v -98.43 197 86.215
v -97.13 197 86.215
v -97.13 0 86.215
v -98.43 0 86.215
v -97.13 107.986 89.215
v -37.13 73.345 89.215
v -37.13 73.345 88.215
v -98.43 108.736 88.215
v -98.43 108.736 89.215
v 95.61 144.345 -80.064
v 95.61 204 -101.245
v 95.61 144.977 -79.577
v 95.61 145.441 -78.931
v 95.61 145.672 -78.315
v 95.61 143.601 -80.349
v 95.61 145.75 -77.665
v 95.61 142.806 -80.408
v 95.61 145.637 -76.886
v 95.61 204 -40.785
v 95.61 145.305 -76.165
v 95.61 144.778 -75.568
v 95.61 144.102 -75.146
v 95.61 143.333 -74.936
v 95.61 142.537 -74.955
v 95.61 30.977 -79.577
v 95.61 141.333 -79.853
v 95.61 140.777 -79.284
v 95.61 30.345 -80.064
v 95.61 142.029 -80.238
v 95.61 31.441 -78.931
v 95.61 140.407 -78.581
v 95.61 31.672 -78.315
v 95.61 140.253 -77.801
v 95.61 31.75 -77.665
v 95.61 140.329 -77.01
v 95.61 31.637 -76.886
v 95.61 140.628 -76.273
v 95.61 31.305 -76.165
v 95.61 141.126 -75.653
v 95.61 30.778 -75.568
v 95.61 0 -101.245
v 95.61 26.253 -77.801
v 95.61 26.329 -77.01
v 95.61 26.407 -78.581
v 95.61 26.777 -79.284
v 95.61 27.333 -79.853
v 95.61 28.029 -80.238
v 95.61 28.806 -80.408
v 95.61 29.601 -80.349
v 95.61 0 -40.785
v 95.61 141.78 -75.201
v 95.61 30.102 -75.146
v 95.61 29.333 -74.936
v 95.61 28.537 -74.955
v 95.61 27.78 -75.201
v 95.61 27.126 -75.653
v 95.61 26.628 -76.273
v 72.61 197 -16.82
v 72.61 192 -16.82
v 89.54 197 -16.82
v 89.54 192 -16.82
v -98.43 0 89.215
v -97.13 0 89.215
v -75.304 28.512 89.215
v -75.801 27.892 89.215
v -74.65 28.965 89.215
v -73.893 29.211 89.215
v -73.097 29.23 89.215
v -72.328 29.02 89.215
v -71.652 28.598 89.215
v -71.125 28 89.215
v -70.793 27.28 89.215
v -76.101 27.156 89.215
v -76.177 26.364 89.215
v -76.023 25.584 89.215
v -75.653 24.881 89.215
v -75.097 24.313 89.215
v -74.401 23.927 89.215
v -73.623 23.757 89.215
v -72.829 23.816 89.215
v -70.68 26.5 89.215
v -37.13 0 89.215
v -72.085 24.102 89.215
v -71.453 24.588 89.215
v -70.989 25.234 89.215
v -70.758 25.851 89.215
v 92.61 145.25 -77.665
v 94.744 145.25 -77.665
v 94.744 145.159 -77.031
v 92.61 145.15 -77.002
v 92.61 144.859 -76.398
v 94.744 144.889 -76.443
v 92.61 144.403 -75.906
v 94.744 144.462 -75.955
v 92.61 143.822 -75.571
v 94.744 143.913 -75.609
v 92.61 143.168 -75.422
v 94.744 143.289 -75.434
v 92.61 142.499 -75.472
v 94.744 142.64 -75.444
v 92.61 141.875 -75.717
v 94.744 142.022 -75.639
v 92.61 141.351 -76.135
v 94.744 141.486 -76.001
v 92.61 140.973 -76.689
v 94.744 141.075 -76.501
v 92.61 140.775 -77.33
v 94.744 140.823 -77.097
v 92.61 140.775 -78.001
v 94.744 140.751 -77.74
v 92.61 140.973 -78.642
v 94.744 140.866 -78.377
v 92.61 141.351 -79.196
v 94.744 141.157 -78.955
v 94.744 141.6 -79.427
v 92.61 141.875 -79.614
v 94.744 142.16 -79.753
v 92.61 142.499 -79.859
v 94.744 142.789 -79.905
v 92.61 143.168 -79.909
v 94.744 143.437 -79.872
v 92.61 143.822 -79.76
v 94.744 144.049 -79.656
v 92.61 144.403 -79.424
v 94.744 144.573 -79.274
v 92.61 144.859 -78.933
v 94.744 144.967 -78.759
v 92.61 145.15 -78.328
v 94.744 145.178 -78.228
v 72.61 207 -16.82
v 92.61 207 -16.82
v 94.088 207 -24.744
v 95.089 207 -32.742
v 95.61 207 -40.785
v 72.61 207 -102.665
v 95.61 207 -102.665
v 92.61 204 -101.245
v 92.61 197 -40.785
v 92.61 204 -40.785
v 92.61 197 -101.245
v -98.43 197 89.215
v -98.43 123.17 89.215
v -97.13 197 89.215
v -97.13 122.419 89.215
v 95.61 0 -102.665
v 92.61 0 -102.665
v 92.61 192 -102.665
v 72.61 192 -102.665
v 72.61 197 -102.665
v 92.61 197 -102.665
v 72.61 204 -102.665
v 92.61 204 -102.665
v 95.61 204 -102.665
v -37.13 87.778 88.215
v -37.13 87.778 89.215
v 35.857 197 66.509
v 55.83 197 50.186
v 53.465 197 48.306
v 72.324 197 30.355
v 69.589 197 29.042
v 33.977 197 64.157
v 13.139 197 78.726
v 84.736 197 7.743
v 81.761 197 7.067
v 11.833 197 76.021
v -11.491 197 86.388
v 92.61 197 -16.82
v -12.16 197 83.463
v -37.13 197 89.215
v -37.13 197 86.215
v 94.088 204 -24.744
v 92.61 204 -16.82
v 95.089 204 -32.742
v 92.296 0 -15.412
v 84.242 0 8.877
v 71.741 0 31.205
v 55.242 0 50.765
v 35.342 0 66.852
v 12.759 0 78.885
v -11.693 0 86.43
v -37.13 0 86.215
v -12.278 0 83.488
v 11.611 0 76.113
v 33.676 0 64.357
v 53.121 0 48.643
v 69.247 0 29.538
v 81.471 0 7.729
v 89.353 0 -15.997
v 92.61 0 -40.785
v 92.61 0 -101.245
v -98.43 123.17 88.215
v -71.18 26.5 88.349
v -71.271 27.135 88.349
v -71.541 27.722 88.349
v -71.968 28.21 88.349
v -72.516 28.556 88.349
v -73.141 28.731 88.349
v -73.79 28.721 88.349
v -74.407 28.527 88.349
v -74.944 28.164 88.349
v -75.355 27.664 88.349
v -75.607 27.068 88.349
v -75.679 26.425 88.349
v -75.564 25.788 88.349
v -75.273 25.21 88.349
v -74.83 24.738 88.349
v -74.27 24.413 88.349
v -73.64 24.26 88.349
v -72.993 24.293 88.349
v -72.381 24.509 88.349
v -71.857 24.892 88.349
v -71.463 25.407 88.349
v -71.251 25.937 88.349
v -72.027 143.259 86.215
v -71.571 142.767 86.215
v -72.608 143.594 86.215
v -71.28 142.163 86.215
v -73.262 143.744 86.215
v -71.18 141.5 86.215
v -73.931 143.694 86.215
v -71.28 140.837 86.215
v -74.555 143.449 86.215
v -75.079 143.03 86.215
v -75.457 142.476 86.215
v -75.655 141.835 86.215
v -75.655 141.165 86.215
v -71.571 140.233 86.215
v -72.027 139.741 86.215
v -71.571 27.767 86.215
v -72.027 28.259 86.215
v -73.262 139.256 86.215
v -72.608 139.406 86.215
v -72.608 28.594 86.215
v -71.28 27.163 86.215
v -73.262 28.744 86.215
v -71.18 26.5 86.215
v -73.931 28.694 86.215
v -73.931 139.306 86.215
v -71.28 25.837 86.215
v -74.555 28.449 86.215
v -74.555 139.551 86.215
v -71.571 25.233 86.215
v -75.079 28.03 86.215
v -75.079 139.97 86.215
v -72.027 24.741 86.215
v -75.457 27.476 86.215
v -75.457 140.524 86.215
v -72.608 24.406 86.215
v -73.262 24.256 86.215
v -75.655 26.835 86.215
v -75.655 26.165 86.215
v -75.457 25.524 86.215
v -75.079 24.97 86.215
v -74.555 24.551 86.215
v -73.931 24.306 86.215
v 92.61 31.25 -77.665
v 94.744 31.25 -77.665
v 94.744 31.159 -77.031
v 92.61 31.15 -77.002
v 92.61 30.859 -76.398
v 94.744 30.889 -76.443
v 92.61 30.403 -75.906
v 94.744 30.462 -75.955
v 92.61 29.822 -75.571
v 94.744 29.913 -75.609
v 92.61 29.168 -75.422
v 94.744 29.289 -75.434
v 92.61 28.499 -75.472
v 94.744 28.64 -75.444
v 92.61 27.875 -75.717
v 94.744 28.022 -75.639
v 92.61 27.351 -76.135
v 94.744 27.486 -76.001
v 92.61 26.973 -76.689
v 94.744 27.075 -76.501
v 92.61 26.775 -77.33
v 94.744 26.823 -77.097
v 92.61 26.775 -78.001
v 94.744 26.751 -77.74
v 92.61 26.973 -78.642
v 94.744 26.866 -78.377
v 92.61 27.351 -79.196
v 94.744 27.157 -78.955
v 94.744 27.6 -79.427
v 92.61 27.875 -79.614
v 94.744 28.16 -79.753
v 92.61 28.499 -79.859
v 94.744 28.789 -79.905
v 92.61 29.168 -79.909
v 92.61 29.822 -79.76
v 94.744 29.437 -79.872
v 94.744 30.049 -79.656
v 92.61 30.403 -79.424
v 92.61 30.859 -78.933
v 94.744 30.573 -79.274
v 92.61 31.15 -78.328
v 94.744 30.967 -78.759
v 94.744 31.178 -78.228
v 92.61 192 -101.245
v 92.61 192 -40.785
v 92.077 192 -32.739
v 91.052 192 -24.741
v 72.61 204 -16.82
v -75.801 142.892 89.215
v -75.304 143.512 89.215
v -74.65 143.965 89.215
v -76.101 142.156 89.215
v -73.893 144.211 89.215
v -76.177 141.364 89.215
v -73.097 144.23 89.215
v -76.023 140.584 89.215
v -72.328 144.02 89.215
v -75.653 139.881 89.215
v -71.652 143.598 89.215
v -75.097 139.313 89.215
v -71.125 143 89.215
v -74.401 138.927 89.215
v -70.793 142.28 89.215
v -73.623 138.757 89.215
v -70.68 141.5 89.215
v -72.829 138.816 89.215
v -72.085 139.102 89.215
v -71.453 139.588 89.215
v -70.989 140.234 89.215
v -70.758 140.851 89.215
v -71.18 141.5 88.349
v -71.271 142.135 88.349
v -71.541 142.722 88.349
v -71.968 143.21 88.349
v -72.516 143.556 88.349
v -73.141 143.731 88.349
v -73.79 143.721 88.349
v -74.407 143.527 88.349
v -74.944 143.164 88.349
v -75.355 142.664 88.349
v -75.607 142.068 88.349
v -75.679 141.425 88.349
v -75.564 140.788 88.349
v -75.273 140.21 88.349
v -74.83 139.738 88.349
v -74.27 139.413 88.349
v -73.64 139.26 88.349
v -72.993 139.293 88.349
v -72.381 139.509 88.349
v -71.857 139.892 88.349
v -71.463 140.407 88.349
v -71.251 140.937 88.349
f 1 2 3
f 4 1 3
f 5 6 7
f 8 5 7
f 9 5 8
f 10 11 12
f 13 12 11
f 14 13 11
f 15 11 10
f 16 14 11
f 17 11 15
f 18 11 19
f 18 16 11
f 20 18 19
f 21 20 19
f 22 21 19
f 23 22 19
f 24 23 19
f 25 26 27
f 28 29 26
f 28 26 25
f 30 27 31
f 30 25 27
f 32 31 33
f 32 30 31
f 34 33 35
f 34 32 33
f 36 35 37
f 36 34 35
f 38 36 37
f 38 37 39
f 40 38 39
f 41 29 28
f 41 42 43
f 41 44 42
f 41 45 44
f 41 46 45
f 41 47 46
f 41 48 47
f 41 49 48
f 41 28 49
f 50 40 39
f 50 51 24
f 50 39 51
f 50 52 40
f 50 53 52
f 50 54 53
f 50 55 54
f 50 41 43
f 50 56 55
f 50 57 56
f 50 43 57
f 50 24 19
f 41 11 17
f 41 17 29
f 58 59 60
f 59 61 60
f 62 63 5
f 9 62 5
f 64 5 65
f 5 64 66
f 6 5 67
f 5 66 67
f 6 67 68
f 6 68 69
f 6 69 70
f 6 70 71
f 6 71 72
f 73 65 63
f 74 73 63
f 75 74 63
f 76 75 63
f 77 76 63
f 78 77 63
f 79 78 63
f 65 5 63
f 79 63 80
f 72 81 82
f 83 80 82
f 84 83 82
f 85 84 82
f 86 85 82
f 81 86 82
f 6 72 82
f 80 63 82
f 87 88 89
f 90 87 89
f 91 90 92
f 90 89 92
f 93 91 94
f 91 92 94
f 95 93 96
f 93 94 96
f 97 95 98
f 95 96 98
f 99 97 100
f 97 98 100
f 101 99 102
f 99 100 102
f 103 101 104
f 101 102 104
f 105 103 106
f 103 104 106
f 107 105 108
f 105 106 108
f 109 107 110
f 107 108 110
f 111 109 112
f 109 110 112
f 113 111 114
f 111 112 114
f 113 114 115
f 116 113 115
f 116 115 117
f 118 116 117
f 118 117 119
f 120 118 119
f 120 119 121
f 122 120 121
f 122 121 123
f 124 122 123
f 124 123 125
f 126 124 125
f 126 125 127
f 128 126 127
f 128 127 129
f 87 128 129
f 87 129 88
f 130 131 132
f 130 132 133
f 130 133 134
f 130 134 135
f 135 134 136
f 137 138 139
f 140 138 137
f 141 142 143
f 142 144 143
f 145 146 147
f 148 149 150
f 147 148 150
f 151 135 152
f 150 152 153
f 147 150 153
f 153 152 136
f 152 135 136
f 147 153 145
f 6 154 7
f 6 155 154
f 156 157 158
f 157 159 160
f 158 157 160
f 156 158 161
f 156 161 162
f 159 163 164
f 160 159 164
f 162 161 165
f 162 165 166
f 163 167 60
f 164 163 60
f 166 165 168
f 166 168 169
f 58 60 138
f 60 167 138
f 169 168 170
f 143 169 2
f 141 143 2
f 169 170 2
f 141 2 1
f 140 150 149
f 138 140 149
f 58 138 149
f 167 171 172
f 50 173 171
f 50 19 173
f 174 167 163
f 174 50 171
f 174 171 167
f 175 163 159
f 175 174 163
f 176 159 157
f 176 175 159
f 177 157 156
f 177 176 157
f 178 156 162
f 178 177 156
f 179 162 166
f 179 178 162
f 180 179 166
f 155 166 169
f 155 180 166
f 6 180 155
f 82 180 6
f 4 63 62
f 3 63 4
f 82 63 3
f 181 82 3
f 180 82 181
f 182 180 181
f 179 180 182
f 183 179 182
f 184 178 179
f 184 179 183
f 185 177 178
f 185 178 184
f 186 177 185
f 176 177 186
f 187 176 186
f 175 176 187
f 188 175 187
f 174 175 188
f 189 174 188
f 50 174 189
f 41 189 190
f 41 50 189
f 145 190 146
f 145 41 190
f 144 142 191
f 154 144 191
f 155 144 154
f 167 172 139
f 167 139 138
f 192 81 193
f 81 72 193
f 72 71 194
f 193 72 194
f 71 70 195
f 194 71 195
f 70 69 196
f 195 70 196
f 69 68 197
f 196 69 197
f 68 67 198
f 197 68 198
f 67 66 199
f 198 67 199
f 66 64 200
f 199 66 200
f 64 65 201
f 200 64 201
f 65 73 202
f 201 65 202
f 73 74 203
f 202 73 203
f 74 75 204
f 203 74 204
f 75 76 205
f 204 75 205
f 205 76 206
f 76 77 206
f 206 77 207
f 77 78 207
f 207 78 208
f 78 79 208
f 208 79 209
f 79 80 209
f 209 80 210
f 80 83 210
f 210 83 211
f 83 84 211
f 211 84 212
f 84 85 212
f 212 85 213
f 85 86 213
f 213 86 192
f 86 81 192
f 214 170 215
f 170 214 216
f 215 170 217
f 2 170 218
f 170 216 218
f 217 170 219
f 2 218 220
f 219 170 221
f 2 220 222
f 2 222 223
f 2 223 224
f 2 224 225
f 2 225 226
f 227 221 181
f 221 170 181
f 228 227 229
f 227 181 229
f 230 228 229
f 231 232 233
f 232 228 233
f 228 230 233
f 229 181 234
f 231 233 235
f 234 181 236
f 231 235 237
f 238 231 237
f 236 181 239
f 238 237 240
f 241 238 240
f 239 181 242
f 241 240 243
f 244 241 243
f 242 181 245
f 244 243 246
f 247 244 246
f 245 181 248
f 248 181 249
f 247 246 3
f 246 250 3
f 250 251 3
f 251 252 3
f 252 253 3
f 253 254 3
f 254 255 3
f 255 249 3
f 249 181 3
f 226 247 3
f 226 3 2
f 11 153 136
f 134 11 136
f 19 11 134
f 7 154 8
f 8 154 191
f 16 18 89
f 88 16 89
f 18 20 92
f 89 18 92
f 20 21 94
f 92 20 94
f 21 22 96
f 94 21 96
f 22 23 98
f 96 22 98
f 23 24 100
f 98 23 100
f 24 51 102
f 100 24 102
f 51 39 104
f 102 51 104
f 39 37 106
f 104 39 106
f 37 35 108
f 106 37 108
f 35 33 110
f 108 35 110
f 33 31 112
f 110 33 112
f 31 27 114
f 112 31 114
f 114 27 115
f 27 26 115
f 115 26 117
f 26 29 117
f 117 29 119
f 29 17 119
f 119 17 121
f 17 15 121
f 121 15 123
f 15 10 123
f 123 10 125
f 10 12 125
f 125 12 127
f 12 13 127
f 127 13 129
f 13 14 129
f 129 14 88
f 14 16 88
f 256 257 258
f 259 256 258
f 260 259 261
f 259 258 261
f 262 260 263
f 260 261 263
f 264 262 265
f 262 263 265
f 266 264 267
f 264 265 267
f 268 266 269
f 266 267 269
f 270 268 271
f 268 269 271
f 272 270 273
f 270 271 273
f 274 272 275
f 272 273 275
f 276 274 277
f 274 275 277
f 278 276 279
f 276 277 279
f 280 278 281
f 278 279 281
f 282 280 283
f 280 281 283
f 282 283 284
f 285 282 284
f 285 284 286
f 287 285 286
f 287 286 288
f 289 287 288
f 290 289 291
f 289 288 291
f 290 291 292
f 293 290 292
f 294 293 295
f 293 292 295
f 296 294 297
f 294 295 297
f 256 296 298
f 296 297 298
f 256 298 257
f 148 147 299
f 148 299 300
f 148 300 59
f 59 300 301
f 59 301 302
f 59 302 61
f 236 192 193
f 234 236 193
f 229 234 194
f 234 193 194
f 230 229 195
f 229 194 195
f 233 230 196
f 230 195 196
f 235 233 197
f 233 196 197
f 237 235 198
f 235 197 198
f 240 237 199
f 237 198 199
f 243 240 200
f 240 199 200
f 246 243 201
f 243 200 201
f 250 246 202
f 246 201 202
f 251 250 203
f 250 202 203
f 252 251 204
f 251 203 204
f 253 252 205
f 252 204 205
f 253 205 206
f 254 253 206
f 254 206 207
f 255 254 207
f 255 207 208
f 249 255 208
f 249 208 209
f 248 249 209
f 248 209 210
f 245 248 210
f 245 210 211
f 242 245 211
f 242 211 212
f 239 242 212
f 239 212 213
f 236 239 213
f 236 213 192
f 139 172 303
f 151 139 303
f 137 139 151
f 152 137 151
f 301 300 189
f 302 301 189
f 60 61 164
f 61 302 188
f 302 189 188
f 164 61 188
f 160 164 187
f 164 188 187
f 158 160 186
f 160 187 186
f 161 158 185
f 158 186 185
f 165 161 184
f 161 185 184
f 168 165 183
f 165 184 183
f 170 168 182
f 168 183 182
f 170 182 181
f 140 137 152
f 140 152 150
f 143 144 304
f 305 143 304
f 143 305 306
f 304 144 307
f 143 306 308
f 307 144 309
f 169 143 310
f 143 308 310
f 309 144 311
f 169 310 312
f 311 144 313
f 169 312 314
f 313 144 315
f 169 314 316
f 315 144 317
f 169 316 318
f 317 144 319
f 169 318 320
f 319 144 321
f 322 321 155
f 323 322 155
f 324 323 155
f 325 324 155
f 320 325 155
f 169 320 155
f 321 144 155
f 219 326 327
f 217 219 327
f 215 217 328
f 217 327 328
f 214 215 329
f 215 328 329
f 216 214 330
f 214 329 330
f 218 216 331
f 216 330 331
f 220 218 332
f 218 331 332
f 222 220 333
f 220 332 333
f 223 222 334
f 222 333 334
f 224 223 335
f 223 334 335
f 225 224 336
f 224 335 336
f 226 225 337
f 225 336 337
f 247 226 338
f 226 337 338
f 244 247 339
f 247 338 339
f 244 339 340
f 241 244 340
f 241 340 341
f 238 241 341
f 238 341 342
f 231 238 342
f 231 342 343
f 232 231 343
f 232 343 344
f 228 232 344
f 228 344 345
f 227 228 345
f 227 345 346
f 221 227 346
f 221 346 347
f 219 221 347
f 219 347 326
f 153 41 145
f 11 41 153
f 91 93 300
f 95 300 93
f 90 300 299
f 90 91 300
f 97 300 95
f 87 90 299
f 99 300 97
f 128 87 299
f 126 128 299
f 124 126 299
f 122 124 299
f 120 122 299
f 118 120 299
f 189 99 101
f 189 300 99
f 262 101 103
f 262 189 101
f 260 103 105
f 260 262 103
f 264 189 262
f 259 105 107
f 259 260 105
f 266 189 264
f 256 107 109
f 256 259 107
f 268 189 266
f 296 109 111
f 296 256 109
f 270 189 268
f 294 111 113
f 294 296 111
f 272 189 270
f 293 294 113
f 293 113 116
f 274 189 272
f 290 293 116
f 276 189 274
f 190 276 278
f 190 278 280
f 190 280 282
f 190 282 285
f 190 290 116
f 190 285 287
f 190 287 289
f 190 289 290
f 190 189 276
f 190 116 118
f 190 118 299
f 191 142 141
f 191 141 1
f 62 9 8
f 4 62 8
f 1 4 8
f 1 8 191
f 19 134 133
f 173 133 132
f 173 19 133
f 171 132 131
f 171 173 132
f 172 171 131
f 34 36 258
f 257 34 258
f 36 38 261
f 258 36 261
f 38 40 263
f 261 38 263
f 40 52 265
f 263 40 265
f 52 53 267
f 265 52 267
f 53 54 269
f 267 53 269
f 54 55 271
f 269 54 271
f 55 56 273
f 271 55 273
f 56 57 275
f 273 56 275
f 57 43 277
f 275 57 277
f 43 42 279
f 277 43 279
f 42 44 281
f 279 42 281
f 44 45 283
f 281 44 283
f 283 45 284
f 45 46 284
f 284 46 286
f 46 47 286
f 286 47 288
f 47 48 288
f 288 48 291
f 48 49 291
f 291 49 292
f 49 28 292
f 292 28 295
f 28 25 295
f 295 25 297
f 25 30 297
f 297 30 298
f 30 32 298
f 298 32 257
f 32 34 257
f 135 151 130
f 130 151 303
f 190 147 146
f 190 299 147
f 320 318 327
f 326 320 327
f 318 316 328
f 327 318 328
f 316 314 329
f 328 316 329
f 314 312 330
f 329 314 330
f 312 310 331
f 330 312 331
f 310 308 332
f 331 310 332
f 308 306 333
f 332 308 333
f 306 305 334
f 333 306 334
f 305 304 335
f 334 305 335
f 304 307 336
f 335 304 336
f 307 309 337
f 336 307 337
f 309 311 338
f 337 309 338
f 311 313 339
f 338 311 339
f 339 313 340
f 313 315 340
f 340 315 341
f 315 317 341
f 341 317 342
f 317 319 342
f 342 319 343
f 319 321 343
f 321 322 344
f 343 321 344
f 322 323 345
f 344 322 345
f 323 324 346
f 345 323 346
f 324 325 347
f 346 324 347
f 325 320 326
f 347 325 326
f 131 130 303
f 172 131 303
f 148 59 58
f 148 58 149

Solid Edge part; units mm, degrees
sketch "Sketch1" plane through (0, 0, 0) normal (0, -1, 0) x (1, 0, 0)
  arc A0 (-37.1299, 86.2147) -> (92.6101, -40.7853) centre (-39.0034, -45.4688) cw
  line L0 (92.6101, -40.7853) -> (92.6101, -101.2453)
  line L1 (92.6101, -101.2453) -> (95.6101, -101.2453)
  line L2 (95.6101, -101.2453) -> (95.6101, -40.7853)
  arc A1 (-37.1299, 89.2147) -> (95.6101, -40.7853) centre (-39.0019, -45.4657) cw
  line L3 (-97.1299, 89.2147) -> (-37.1299, 89.2147)
  line L4 (-97.1299, 86.2147) -> (-97.1299, 89.2147)
  line L5 (-37.1299, 86.2147) -> (-97.1299, 86.2147)
  dimension "D1" = 129.74
  dimension "D2" = 127
  dimension "D3" = 60
  dimension "D4" = 60.46
  dimension "D5" = 3
  dimension "D6" = 3
  dimension "D7" = 3
extrude "Protrusion1" add sketch "Sketch1" against normal blind 204
sketch "Sketch2" plane through (-67.1299, 85, 89.2147) normal (0, 0, 1) x (1, 0, 0)
  circle A0 centre (-6.3, -58.5) radius 2.25
  circle A1 centre (-6.3, 56.5) radius 2.25
  dimension "D1" = 23.7
  dimension "D2" = 4.5
  dimension "D3" = 115
  dimension "D4" = 26.5
extrude "Cutout1" cut sketch "Sketch2" against normal through all
sketch "Sketch3" plane through (95.6101, 85, -66.0153) normal (1, 0, 0) x (0, 1, 0)
  circle A0 centre (58, -11.65) radius 2.25
  circle A1 centre (-56, -11.65) radius 2.25
  dimension "D1" = 114
  dimension "D2" = 4.5
  dimension "D3" = 4.5
  dimension "D4" = 23.58
  dimension "D5" = 73
extrude "Cutout2" cut sketch "Sketch3" against normal through all
sketch "Sketch4" plane through (-97.1299, 102, 87.7147) normal (-1, 0, 0) x (0, -1, 0)
  line L0 (-102, -1.5) -> (102, -1.5)
  line L1 (102, -1.5) -> (102, 1.5)
  line L2 (102, 1.5) -> (-102, 1.5)
  line L3 (-102, 1.5) -> (-102, -1.5)
extrude "Extrusionsausprägung_3" add sketch "Sketch4" along normal blind 1.3
sketch "Sketch5" plane through (94.1101, 102, -101.2453) normal (0, 0, -1) x (0, 1, 0)
  line L0 (-102, 1.5) -> (102, 1.5)
  line L1 (102, 1.5) -> (102, -1.5)
  line L2 (102, -1.5) -> (-102, -1.5)
  line L3 (-102, -1.5) -> (-102, 1.5)
extrude "Extrusionsausprägung_4" add sketch "Sketch5" along normal blind 1.42
sketch "Sketch6" plane through (-67.7799, 102, 89.2147) normal (0, 0, 1) x (0, 1, 0)
  line L0 (21.17, 30.65) -> (-14.2216, -30.65)
  line L1 (-14.2216, -30.65) -> (-28.6553, -30.65)
  line L2 (-28.6553, -30.65) -> (6.7362, 30.65)
  line L3 (6.7362, 30.65) -> (21.17, 30.65)
  dimension "D1" = 12.5
  dimension "D2" = 80.83
extrude "Extrusionsausschnitt_3" cut sketch "Sketch6" against normal blind 1
chamfer "Fase_1" distance 0.5 angle 60 4 edges at (-75.6799, 26.5, 89.2147) (-75.6799, 141.5, 89.2147) (95.6101, 26.75, -77.6653) (95.6101, 140.75, -77.6653) measured on face at (-87.7299, 88.9082, 89.2147) measured on face at (-87.7299, 183.4675, 89.2147) measured on face at (-87.7299, 88.9082, 89.2147) measured on face at (-87.7299, 183.4675, 89.2147) measured on face at (95.6101, 167.96, -91.7732)
sketch "Sketch7" plane through (-67.7799, 145.8892, 89.2147) normal (0, 0, 1) x (-1, 0, 0)
  line L0 (30.65, -58.1108) -> (-160.39, -58.1108)
  line L1 (-160.39, -58.1108) -> (-160.39, -53.1108)
  line L2 (-160.39, -53.1108) -> (30.65, -53.1108)
  line L3 (30.65, -53.1108) -> (30.65, -58.1108)
  dimension "D1" = 5
  dimension "D2" = 191.04
extrude "Cutout3" cut sketch "Sketch7" against normal up to next
sketch "Sketch8" plane through (94.1101, 204, -59.7426) normal (0, 1, 0) x (0, 0, -1)
  line L0 (-42.9227, 1.5) -> (42.9227, 1.5)
  line L1 (42.9227, 1.5) -> (42.9227, -1.5)
  line L2 (42.9227, -1.5) -> (-18.9573, -1.5)
  arc A0 (-18.9573, -1.5) -> (-42.9227, 1.5) centre (-14.2769, 133.1121) cw
extrude "Extrusionsausprägung_7" add sketch "Sketch8" along normal blind 3
sketch "Sketch9" plane through (92.6101, 103.5, -59.7426) normal (-1, 0, 0) x (0, -1, 0)
  line L0 (-88.5, 42.9227) -> (-93.5, 42.9227)
  line L1 (-93.5, 42.9227) -> (-93.5, -42.9227)
  line L2 (-93.5, -42.9227) -> (-88.5, -42.9227)
  line L3 (-88.5, -42.9227) -> (-88.5, 42.9227)
  line L4 (-103.5, 42.9227) -> (-100.5, 42.9227)
  line L5 (-100.5, 42.9227) -> (-100.5, -42.9227)
  line L6 (-100.5, -42.9227) -> (-103.5, -42.9227)
  line L7 (-103.5, -42.9227) -> (-103.5, 42.9227)
  dimension "D1" = 3
  dimension "D2" = 5
  dimension "D3" = 7
  dimension "D4" = 85.8453
extrude "Extrusionsausprägung_8" add sketch "Sketch9" along normal blind 20
sketch "Sketch10" plane through (84.1101, 103.5, -102.6653) normal (0, 0, -1) x (0, 1, 0)
  line L0 (93.5, 8.5) -> (93.5, -182.54)
  line L1 (93.5, -182.54) -> (97, -182.54)
  line L2 (97, -182.54) -> (97, 8.5)
  line L3 (97, 8.5) -> (93.5, 8.5)
extrude "Cutout4" cut sketch "Sketch10" against normal up to next
properties material "Nylon, allgemein"
